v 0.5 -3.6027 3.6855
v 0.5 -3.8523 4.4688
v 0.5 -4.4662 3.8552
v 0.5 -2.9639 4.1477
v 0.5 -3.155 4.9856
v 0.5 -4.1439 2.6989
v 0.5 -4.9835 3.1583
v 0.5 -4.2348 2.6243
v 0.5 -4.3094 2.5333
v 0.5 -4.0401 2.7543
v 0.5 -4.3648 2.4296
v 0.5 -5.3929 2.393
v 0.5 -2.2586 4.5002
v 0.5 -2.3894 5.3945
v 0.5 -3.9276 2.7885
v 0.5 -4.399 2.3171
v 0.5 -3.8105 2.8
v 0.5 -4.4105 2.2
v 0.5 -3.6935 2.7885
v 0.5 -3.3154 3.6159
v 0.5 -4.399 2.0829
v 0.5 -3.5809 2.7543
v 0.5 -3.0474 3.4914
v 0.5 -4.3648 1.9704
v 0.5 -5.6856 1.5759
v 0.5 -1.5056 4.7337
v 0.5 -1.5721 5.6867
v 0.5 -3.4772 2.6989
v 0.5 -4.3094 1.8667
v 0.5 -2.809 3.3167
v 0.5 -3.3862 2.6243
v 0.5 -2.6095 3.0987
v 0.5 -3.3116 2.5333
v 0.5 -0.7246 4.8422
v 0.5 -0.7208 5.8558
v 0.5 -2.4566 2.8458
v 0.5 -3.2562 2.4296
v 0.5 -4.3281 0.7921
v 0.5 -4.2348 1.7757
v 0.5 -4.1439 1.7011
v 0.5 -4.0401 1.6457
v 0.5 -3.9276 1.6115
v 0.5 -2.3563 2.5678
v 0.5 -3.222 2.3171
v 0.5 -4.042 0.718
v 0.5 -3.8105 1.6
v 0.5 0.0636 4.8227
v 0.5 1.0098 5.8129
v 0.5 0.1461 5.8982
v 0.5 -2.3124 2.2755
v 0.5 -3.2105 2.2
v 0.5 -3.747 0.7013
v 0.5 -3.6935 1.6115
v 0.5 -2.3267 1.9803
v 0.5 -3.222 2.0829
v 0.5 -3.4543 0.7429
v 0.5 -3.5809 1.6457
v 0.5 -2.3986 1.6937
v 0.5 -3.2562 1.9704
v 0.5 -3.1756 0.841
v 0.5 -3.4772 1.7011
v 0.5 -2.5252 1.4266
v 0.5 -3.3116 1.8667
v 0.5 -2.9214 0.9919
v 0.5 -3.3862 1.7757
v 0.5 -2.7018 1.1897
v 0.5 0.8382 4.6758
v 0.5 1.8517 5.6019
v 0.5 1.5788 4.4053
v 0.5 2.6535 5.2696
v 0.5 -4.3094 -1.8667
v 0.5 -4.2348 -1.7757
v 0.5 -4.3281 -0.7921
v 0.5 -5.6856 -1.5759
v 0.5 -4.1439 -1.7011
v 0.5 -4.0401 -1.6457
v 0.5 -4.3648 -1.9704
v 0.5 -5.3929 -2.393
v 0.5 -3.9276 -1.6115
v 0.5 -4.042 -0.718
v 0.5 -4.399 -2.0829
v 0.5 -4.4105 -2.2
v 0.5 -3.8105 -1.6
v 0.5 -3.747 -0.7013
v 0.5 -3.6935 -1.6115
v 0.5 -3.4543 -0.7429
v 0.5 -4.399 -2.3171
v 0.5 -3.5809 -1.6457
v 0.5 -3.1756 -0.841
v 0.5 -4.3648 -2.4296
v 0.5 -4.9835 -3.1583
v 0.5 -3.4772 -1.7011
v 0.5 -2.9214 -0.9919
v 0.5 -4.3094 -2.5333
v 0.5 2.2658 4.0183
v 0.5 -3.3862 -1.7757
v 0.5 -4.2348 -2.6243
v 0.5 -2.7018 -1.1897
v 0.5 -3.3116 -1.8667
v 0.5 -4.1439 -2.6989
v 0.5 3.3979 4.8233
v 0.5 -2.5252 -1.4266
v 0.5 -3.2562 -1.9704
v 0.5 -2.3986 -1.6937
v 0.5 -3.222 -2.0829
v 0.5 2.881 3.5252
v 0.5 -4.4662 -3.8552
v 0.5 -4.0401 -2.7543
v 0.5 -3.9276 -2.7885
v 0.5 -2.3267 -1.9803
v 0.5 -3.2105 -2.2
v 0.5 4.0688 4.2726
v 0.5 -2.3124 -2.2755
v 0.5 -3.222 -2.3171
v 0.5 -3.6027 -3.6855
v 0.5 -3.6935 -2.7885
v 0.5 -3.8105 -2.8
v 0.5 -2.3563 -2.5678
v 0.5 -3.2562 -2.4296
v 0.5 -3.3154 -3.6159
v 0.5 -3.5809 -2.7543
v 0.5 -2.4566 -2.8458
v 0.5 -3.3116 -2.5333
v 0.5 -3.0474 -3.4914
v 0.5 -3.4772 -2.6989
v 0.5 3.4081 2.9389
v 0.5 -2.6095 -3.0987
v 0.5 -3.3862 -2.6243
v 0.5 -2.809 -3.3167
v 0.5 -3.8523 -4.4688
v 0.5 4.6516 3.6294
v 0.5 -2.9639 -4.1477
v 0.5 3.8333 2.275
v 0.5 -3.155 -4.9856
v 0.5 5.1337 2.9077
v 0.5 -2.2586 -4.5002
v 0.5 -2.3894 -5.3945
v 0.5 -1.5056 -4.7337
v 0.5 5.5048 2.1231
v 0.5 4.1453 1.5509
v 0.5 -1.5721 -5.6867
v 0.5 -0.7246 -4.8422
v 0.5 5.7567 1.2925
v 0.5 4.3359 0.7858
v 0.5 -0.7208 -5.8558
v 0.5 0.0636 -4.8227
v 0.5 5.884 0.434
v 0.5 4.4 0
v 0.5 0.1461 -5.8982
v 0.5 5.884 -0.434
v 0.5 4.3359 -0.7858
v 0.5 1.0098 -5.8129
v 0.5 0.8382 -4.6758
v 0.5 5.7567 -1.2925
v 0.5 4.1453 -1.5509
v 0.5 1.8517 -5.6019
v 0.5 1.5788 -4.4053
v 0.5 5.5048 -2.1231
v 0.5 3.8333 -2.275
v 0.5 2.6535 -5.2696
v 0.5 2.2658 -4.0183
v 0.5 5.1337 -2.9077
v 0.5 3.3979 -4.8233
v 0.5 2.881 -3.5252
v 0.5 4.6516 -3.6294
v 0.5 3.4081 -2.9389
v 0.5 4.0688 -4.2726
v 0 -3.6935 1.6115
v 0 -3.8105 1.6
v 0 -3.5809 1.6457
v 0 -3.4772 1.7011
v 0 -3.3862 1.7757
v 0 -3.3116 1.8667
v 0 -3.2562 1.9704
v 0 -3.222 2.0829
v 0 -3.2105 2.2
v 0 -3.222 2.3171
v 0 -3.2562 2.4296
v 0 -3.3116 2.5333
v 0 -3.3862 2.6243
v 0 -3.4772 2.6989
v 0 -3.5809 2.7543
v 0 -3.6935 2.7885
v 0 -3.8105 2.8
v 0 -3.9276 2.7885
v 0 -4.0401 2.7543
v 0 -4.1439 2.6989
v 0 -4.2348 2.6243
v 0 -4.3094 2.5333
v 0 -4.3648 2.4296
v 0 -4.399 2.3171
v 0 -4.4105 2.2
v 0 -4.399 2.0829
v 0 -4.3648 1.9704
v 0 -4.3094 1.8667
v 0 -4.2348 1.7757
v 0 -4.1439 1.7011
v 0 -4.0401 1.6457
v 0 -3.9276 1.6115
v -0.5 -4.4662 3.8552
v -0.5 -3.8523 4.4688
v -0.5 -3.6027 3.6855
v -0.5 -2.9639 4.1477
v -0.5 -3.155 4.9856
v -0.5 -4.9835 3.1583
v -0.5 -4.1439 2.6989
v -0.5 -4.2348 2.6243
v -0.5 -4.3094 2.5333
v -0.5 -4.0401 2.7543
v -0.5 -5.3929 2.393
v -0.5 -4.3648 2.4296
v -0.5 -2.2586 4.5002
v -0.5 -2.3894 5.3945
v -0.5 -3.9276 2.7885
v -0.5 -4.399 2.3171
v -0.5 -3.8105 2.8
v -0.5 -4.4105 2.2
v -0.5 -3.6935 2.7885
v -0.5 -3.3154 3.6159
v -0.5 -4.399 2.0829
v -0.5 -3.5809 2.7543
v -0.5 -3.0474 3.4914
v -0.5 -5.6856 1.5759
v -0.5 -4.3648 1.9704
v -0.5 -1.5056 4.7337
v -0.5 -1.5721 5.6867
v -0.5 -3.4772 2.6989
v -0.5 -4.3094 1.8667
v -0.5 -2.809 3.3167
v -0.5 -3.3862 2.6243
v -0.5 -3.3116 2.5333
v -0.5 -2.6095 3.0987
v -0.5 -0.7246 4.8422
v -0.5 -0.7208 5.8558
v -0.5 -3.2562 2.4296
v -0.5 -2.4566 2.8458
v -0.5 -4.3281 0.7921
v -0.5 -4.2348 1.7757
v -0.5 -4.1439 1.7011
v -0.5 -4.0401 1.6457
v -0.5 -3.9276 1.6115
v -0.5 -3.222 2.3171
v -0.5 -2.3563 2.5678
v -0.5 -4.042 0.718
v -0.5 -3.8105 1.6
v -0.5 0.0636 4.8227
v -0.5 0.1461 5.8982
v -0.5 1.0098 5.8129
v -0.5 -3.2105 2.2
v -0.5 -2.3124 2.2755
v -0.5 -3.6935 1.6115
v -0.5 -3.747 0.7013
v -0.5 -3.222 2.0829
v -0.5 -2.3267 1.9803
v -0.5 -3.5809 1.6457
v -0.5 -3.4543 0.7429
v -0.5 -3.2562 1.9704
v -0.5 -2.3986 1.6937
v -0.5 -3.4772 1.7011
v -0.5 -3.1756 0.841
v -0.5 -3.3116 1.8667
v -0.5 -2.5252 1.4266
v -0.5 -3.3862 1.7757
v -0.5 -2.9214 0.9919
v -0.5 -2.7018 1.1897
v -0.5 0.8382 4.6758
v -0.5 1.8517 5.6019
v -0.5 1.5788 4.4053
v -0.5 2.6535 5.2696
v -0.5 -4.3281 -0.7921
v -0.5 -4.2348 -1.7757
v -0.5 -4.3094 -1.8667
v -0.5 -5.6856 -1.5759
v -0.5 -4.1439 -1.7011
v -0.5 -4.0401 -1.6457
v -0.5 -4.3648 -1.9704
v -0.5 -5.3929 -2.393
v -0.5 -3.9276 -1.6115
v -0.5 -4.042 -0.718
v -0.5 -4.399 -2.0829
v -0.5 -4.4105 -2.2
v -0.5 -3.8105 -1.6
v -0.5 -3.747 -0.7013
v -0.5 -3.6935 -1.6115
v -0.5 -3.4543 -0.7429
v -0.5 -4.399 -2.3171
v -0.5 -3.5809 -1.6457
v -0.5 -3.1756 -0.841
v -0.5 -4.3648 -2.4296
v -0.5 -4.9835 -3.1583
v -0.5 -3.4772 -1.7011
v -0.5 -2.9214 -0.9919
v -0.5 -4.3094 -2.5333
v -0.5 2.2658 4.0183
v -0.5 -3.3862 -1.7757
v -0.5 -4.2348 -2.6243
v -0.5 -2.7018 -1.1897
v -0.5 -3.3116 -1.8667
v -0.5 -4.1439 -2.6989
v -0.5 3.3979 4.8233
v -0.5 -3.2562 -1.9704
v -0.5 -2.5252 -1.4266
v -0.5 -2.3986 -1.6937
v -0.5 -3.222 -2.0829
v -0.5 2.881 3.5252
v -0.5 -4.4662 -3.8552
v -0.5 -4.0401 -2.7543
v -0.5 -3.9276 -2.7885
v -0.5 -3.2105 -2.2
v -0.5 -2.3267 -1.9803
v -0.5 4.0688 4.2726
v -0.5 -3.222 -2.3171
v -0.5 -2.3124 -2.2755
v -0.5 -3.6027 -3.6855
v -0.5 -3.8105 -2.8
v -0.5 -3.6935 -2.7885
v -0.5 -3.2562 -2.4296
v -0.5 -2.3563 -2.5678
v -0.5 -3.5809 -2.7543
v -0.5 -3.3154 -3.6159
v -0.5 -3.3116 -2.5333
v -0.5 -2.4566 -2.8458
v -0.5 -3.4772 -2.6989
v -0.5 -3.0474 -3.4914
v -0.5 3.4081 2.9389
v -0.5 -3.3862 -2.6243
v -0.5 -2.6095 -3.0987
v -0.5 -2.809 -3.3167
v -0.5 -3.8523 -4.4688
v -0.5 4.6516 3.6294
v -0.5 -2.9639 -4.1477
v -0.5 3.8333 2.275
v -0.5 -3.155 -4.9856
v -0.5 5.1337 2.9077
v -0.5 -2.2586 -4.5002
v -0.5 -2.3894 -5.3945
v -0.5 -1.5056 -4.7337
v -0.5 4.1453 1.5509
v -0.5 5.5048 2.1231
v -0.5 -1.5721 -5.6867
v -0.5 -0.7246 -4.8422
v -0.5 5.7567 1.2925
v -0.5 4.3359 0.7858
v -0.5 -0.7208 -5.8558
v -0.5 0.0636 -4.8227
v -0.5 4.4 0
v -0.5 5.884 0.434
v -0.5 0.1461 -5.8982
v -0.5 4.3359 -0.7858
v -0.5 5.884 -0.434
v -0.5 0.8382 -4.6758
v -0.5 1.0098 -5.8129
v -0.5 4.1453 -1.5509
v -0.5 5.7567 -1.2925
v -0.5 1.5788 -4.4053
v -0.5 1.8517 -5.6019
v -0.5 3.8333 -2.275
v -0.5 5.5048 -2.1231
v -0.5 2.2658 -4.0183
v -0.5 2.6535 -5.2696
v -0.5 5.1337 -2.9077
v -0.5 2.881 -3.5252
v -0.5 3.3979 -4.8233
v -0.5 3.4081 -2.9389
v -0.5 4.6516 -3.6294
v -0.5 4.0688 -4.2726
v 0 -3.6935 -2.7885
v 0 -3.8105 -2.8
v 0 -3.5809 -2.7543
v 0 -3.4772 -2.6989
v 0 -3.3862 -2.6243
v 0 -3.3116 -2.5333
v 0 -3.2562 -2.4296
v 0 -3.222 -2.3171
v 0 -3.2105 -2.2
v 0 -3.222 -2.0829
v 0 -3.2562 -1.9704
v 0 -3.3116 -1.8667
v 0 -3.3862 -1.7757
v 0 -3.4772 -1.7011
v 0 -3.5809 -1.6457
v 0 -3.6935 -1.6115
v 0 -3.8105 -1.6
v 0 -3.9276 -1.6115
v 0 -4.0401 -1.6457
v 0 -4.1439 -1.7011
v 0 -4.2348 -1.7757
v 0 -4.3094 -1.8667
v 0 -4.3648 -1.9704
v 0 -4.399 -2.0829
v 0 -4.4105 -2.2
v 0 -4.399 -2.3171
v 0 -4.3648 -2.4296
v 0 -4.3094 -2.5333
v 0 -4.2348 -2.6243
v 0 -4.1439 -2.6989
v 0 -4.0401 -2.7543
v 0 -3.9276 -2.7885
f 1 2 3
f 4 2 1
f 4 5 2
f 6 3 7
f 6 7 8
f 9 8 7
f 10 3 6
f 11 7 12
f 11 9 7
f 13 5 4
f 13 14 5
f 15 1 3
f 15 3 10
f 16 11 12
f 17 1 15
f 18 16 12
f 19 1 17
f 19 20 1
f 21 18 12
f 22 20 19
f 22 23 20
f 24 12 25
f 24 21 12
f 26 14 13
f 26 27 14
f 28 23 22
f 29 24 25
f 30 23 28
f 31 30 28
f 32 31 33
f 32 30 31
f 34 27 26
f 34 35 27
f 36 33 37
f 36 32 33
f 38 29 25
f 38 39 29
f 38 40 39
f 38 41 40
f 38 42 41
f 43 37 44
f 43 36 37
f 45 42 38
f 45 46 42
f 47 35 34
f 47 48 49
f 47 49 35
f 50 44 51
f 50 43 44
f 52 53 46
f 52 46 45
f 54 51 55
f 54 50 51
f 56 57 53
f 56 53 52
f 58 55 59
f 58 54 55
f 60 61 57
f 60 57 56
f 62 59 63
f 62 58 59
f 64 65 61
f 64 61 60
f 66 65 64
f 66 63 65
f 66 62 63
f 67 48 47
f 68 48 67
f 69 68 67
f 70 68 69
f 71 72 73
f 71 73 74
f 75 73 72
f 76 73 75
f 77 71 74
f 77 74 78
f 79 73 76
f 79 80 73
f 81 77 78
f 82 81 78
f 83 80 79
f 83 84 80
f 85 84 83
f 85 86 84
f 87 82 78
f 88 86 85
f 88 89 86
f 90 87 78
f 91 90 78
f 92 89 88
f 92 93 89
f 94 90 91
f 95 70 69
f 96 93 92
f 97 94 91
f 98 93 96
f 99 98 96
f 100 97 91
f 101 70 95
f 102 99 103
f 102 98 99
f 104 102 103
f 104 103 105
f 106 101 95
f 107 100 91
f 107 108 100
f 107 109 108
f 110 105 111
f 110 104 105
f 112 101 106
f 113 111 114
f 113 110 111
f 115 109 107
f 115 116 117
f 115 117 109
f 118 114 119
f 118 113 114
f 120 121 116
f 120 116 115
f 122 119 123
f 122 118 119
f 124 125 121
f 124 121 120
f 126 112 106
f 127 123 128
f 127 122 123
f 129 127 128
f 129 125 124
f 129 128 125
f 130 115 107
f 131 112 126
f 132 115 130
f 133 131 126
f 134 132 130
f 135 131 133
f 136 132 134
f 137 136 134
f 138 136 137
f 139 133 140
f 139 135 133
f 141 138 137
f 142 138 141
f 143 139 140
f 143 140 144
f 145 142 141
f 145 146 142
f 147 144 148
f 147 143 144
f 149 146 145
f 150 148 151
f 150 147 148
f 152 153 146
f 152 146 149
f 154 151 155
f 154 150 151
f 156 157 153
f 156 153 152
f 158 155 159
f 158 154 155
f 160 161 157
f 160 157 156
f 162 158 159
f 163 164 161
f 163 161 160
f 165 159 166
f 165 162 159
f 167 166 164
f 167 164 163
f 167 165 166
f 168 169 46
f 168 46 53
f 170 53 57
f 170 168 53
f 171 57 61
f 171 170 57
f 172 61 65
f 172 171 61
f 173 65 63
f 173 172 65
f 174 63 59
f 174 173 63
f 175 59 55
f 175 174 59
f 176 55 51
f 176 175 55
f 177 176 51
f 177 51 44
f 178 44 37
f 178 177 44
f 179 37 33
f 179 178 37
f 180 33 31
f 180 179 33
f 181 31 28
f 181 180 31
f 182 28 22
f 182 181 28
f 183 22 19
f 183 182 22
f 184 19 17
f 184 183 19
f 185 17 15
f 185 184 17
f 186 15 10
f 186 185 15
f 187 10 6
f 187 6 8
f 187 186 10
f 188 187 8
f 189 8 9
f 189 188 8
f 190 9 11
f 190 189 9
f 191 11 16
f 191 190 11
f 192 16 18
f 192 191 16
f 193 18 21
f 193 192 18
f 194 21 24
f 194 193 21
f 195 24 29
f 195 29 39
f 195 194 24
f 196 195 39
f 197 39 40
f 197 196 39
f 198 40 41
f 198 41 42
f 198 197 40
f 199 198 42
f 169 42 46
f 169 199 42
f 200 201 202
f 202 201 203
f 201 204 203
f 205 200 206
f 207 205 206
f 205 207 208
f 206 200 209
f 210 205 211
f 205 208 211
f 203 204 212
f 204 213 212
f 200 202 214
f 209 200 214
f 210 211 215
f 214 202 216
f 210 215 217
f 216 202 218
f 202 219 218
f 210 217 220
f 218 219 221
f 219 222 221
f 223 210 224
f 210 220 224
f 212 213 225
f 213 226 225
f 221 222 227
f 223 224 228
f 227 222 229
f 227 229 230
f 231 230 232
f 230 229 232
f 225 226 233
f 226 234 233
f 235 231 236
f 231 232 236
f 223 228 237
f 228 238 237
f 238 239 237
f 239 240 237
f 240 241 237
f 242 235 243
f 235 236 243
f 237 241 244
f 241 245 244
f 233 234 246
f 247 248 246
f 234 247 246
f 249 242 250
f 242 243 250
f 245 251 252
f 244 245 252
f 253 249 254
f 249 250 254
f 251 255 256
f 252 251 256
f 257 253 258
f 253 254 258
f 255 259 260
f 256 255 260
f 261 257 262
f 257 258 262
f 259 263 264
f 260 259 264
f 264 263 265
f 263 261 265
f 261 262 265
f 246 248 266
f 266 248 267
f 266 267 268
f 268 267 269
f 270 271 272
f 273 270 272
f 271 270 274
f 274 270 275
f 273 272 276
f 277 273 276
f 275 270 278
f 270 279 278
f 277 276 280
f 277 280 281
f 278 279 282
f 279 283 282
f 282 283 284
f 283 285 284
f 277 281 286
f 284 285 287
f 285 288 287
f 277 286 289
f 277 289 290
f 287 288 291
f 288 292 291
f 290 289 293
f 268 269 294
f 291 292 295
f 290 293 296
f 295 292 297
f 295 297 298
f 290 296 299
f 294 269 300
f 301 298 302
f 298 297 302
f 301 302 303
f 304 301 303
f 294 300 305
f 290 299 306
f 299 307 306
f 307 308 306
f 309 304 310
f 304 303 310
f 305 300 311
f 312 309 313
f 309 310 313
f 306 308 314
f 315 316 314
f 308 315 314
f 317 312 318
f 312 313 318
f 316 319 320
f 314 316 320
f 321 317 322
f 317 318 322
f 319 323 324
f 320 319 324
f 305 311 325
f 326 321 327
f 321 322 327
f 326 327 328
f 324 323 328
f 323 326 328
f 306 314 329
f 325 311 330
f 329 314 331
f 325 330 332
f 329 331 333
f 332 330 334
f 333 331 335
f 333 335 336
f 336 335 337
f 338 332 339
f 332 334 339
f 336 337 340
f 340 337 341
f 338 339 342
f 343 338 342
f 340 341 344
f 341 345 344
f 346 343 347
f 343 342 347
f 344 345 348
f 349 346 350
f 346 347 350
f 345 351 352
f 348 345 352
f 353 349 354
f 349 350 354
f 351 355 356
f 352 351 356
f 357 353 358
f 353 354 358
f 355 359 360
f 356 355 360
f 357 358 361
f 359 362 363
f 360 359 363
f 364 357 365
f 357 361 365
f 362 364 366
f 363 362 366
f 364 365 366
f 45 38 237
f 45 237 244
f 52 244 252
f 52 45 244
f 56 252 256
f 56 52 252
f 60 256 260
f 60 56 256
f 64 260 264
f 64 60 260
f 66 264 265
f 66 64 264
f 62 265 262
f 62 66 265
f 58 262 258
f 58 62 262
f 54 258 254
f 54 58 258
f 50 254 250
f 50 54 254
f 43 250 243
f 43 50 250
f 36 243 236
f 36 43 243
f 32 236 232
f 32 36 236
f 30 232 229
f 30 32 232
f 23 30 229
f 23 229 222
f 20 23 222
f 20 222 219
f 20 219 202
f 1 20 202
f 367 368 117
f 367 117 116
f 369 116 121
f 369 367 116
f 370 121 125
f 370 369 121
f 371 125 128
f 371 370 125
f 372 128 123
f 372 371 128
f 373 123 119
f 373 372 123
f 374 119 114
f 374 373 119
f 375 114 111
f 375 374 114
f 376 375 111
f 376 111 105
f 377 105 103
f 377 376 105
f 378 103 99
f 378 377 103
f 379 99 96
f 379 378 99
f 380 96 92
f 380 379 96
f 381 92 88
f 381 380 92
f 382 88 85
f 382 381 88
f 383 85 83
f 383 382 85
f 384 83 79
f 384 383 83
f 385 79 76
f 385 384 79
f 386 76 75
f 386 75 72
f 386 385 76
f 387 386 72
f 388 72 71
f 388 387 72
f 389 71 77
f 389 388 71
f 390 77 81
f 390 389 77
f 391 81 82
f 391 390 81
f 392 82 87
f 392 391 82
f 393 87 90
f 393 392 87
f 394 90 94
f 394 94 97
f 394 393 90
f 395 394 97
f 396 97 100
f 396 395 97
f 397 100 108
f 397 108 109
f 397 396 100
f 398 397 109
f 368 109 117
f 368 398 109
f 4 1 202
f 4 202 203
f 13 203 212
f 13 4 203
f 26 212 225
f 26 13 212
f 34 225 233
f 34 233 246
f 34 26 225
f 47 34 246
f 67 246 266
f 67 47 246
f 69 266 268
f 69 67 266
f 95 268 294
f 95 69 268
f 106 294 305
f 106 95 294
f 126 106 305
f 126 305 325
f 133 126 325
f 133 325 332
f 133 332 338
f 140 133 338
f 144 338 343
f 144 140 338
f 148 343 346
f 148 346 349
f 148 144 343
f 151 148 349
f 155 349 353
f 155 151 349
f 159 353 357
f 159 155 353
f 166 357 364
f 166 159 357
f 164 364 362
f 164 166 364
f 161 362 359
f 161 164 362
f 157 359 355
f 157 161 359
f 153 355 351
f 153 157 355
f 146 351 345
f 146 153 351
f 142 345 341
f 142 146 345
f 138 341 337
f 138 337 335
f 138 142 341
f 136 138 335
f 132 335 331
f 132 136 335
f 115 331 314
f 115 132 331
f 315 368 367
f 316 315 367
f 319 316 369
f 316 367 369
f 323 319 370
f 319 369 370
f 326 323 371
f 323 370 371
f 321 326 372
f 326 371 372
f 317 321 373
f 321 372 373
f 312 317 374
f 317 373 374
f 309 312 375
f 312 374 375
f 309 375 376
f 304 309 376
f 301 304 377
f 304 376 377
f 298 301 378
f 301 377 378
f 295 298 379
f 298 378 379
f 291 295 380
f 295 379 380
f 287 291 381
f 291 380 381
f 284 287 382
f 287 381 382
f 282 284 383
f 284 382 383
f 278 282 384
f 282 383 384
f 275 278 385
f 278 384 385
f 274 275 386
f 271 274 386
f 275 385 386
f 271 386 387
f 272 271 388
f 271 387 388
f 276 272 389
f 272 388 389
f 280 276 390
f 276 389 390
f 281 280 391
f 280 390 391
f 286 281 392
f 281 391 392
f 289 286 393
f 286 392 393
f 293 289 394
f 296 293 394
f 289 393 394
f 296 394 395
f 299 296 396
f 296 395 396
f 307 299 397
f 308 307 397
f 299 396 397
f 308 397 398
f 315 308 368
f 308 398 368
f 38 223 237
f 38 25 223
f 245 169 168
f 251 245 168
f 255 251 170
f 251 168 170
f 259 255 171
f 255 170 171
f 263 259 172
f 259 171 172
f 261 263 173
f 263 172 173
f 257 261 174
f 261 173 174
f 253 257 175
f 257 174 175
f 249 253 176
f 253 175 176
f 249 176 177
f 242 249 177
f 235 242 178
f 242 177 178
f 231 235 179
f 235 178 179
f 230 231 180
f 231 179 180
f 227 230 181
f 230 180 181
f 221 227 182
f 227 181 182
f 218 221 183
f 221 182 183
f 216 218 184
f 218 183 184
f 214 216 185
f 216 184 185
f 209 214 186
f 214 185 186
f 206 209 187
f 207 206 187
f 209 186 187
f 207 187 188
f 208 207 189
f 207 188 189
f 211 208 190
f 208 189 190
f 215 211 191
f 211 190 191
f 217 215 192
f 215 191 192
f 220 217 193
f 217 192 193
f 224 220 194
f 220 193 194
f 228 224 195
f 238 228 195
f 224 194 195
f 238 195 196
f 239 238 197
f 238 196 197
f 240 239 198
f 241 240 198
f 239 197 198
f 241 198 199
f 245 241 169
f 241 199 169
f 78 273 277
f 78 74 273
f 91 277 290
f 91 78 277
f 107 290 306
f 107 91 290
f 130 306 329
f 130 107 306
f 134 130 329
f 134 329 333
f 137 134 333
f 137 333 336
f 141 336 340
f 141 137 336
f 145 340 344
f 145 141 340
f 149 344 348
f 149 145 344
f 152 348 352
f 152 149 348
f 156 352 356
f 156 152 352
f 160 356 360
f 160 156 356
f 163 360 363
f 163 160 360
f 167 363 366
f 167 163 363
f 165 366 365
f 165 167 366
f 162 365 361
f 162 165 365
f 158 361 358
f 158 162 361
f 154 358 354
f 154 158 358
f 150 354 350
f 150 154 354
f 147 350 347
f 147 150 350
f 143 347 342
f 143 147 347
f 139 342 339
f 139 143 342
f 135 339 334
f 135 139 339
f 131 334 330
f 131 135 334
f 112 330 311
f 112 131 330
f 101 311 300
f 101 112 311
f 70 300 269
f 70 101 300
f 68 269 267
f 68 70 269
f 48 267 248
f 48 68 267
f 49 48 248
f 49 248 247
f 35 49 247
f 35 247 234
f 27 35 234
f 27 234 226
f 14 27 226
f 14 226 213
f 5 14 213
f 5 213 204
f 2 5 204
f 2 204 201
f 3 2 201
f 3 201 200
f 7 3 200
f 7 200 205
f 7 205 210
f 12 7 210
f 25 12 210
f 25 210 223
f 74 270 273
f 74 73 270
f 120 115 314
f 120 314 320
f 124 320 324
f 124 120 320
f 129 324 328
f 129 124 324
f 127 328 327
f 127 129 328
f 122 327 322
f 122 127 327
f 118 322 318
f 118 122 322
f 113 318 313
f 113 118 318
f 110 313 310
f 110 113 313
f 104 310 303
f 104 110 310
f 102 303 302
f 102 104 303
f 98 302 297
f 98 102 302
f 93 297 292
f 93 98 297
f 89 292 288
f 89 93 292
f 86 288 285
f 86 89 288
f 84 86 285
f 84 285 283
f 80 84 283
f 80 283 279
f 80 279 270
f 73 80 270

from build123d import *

# Parameters (mm, degrees)
BOSS_EXTRUDE1_DEPTH      = 0.5
BOSS_EXTRUDE1_DEPTH_BACK = 0.5
SKETCH1_R                = 0.6


with BuildPart() as part:
    # Sketch1 → Boss-Extrude1 (new, two sides: drawn at the far end of the back side and taken through both)
    with BuildSketch(Plane(origin=(0, 0, 0), x_dir=(0, 0, -1), z_dir=(1, 0, 0)).offset(-BOSS_EXTRUDE1_DEPTH_BACK)):
        with BuildLine():
            Line((-1.575903864, -5.685642181), (-0.792131706, -4.328108982))
            ThreePointArc((-0.792131706, -4.328108982), (-1.835210176, -2.355544978), (-3.685531471, -3.602674702))
            ThreePointArc((-3.685531471, -3.602674702), (0, 4.4), (3.685531471, -3.602674702))
            ThreePointArc((3.685531471, -3.602674702), (1.835210176, -2.355544978), (0.792131706, -4.328108982))
            Line((0.792131706, -4.328108982), (1.575903864, -5.685642181))
            ThreePointArc((1.575903864, -5.685642181), (0, 5.9), (-1.575903864, -5.685642181))
        make_face()
        with Locations((2.2, -3.810511777)):
            Circle(SKETCH1_R, mode=Mode.SUBTRACT)
        with Locations((-2.2, -3.810511777)):
            Circle(SKETCH1_R, mode=Mode.SUBTRACT)
    extrude(amount=BOSS_EXTRUDE1_DEPTH + BOSS_EXTRUDE1_DEPTH_BACK)


solid = part.part
